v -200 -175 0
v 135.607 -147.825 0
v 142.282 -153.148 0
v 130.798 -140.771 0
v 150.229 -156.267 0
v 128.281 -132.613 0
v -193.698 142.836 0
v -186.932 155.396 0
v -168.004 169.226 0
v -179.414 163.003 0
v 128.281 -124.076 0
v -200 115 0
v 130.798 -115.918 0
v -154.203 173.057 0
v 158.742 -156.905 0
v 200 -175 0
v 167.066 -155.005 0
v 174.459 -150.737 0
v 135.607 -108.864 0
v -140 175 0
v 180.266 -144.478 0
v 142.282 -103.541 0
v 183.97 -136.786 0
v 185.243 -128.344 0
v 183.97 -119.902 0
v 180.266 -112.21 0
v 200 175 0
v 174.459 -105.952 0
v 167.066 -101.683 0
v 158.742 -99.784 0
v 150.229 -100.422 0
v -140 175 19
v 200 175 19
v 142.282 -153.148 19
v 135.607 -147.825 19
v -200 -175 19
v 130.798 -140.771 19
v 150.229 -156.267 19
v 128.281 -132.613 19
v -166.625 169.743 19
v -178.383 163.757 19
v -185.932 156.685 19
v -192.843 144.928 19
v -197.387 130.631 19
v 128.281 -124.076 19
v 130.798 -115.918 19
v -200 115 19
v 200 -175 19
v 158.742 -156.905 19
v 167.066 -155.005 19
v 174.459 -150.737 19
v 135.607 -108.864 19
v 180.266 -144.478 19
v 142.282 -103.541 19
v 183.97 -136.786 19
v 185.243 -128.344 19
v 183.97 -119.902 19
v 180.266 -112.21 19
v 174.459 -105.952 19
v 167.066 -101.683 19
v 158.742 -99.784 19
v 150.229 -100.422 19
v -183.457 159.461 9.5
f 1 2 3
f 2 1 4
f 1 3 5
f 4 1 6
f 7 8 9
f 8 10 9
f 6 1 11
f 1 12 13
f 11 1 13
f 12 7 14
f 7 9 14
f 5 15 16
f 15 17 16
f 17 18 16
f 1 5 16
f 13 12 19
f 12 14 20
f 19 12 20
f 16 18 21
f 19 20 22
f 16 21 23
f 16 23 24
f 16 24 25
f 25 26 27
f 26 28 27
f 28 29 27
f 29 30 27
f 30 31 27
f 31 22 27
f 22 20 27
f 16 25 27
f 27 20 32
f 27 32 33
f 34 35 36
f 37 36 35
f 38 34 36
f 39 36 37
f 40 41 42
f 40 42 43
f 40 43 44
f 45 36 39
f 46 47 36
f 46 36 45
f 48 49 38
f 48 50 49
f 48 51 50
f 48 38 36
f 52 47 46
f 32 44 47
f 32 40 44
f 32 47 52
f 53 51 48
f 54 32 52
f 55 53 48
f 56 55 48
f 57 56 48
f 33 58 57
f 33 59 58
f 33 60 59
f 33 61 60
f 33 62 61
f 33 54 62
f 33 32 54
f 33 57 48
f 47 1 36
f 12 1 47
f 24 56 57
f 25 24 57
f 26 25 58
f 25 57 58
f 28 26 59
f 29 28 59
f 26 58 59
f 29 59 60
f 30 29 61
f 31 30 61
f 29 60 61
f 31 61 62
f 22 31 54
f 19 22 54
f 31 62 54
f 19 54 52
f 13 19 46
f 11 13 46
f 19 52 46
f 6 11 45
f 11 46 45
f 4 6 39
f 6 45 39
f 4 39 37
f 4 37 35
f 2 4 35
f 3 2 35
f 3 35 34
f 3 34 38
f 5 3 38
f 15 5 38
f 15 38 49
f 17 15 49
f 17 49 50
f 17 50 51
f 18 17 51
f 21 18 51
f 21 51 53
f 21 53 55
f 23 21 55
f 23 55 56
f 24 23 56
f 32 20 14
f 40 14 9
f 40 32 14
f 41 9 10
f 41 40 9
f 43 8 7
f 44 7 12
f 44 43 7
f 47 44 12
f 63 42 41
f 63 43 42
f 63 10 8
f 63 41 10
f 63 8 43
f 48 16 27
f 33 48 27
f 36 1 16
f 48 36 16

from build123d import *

# Parameters (mm, degrees)
F0_W     = 400
F0_H     = 350
F1_DEPTH = 19
F3_DEPTH = 19.001
F4_R     = 28.6407244268
F5_DEPTH = 19.0010001


with BuildPart() as f1:
    # F0 (on Top) → F1 (new body)
    with BuildSketch(Plane.XY):
        Rectangle(F0_W, F0_H)
    extrude(amount=F1_DEPTH)

    # F2 (on face) → F3 (cut, through all)
    with BuildSketch(Plane.XY.offset(19)):
        with BuildLine():
            add(Edge.make_bspline(
                [(-140, 175), (-157.942733111, 173.3225620191), (-189.2184929725, 165.8035915867), (-198.0018895699, 132.3529522536), (-200, 115)],
                knots=[0, 0, 0, 0, 0.4965617875, 1, 1, 1, 1], degree=3))
            Line((-140, 175), (-200, 175))
            Line((-200, 175), (-200, 115))
        make_face()
    extrude(amount=-F3_DEPTH, mode=Mode.SUBTRACT)

    # F4 (on face) → F5 (cut, through all)
    with BuildSketch(Plane.XY.offset(19)):
        with Locations((156.6020158332, -128.344308295)):
            Circle(F4_R)
    extrude(amount=-F5_DEPTH, mode=Mode.SUBTRACT)


solid = f1.part
